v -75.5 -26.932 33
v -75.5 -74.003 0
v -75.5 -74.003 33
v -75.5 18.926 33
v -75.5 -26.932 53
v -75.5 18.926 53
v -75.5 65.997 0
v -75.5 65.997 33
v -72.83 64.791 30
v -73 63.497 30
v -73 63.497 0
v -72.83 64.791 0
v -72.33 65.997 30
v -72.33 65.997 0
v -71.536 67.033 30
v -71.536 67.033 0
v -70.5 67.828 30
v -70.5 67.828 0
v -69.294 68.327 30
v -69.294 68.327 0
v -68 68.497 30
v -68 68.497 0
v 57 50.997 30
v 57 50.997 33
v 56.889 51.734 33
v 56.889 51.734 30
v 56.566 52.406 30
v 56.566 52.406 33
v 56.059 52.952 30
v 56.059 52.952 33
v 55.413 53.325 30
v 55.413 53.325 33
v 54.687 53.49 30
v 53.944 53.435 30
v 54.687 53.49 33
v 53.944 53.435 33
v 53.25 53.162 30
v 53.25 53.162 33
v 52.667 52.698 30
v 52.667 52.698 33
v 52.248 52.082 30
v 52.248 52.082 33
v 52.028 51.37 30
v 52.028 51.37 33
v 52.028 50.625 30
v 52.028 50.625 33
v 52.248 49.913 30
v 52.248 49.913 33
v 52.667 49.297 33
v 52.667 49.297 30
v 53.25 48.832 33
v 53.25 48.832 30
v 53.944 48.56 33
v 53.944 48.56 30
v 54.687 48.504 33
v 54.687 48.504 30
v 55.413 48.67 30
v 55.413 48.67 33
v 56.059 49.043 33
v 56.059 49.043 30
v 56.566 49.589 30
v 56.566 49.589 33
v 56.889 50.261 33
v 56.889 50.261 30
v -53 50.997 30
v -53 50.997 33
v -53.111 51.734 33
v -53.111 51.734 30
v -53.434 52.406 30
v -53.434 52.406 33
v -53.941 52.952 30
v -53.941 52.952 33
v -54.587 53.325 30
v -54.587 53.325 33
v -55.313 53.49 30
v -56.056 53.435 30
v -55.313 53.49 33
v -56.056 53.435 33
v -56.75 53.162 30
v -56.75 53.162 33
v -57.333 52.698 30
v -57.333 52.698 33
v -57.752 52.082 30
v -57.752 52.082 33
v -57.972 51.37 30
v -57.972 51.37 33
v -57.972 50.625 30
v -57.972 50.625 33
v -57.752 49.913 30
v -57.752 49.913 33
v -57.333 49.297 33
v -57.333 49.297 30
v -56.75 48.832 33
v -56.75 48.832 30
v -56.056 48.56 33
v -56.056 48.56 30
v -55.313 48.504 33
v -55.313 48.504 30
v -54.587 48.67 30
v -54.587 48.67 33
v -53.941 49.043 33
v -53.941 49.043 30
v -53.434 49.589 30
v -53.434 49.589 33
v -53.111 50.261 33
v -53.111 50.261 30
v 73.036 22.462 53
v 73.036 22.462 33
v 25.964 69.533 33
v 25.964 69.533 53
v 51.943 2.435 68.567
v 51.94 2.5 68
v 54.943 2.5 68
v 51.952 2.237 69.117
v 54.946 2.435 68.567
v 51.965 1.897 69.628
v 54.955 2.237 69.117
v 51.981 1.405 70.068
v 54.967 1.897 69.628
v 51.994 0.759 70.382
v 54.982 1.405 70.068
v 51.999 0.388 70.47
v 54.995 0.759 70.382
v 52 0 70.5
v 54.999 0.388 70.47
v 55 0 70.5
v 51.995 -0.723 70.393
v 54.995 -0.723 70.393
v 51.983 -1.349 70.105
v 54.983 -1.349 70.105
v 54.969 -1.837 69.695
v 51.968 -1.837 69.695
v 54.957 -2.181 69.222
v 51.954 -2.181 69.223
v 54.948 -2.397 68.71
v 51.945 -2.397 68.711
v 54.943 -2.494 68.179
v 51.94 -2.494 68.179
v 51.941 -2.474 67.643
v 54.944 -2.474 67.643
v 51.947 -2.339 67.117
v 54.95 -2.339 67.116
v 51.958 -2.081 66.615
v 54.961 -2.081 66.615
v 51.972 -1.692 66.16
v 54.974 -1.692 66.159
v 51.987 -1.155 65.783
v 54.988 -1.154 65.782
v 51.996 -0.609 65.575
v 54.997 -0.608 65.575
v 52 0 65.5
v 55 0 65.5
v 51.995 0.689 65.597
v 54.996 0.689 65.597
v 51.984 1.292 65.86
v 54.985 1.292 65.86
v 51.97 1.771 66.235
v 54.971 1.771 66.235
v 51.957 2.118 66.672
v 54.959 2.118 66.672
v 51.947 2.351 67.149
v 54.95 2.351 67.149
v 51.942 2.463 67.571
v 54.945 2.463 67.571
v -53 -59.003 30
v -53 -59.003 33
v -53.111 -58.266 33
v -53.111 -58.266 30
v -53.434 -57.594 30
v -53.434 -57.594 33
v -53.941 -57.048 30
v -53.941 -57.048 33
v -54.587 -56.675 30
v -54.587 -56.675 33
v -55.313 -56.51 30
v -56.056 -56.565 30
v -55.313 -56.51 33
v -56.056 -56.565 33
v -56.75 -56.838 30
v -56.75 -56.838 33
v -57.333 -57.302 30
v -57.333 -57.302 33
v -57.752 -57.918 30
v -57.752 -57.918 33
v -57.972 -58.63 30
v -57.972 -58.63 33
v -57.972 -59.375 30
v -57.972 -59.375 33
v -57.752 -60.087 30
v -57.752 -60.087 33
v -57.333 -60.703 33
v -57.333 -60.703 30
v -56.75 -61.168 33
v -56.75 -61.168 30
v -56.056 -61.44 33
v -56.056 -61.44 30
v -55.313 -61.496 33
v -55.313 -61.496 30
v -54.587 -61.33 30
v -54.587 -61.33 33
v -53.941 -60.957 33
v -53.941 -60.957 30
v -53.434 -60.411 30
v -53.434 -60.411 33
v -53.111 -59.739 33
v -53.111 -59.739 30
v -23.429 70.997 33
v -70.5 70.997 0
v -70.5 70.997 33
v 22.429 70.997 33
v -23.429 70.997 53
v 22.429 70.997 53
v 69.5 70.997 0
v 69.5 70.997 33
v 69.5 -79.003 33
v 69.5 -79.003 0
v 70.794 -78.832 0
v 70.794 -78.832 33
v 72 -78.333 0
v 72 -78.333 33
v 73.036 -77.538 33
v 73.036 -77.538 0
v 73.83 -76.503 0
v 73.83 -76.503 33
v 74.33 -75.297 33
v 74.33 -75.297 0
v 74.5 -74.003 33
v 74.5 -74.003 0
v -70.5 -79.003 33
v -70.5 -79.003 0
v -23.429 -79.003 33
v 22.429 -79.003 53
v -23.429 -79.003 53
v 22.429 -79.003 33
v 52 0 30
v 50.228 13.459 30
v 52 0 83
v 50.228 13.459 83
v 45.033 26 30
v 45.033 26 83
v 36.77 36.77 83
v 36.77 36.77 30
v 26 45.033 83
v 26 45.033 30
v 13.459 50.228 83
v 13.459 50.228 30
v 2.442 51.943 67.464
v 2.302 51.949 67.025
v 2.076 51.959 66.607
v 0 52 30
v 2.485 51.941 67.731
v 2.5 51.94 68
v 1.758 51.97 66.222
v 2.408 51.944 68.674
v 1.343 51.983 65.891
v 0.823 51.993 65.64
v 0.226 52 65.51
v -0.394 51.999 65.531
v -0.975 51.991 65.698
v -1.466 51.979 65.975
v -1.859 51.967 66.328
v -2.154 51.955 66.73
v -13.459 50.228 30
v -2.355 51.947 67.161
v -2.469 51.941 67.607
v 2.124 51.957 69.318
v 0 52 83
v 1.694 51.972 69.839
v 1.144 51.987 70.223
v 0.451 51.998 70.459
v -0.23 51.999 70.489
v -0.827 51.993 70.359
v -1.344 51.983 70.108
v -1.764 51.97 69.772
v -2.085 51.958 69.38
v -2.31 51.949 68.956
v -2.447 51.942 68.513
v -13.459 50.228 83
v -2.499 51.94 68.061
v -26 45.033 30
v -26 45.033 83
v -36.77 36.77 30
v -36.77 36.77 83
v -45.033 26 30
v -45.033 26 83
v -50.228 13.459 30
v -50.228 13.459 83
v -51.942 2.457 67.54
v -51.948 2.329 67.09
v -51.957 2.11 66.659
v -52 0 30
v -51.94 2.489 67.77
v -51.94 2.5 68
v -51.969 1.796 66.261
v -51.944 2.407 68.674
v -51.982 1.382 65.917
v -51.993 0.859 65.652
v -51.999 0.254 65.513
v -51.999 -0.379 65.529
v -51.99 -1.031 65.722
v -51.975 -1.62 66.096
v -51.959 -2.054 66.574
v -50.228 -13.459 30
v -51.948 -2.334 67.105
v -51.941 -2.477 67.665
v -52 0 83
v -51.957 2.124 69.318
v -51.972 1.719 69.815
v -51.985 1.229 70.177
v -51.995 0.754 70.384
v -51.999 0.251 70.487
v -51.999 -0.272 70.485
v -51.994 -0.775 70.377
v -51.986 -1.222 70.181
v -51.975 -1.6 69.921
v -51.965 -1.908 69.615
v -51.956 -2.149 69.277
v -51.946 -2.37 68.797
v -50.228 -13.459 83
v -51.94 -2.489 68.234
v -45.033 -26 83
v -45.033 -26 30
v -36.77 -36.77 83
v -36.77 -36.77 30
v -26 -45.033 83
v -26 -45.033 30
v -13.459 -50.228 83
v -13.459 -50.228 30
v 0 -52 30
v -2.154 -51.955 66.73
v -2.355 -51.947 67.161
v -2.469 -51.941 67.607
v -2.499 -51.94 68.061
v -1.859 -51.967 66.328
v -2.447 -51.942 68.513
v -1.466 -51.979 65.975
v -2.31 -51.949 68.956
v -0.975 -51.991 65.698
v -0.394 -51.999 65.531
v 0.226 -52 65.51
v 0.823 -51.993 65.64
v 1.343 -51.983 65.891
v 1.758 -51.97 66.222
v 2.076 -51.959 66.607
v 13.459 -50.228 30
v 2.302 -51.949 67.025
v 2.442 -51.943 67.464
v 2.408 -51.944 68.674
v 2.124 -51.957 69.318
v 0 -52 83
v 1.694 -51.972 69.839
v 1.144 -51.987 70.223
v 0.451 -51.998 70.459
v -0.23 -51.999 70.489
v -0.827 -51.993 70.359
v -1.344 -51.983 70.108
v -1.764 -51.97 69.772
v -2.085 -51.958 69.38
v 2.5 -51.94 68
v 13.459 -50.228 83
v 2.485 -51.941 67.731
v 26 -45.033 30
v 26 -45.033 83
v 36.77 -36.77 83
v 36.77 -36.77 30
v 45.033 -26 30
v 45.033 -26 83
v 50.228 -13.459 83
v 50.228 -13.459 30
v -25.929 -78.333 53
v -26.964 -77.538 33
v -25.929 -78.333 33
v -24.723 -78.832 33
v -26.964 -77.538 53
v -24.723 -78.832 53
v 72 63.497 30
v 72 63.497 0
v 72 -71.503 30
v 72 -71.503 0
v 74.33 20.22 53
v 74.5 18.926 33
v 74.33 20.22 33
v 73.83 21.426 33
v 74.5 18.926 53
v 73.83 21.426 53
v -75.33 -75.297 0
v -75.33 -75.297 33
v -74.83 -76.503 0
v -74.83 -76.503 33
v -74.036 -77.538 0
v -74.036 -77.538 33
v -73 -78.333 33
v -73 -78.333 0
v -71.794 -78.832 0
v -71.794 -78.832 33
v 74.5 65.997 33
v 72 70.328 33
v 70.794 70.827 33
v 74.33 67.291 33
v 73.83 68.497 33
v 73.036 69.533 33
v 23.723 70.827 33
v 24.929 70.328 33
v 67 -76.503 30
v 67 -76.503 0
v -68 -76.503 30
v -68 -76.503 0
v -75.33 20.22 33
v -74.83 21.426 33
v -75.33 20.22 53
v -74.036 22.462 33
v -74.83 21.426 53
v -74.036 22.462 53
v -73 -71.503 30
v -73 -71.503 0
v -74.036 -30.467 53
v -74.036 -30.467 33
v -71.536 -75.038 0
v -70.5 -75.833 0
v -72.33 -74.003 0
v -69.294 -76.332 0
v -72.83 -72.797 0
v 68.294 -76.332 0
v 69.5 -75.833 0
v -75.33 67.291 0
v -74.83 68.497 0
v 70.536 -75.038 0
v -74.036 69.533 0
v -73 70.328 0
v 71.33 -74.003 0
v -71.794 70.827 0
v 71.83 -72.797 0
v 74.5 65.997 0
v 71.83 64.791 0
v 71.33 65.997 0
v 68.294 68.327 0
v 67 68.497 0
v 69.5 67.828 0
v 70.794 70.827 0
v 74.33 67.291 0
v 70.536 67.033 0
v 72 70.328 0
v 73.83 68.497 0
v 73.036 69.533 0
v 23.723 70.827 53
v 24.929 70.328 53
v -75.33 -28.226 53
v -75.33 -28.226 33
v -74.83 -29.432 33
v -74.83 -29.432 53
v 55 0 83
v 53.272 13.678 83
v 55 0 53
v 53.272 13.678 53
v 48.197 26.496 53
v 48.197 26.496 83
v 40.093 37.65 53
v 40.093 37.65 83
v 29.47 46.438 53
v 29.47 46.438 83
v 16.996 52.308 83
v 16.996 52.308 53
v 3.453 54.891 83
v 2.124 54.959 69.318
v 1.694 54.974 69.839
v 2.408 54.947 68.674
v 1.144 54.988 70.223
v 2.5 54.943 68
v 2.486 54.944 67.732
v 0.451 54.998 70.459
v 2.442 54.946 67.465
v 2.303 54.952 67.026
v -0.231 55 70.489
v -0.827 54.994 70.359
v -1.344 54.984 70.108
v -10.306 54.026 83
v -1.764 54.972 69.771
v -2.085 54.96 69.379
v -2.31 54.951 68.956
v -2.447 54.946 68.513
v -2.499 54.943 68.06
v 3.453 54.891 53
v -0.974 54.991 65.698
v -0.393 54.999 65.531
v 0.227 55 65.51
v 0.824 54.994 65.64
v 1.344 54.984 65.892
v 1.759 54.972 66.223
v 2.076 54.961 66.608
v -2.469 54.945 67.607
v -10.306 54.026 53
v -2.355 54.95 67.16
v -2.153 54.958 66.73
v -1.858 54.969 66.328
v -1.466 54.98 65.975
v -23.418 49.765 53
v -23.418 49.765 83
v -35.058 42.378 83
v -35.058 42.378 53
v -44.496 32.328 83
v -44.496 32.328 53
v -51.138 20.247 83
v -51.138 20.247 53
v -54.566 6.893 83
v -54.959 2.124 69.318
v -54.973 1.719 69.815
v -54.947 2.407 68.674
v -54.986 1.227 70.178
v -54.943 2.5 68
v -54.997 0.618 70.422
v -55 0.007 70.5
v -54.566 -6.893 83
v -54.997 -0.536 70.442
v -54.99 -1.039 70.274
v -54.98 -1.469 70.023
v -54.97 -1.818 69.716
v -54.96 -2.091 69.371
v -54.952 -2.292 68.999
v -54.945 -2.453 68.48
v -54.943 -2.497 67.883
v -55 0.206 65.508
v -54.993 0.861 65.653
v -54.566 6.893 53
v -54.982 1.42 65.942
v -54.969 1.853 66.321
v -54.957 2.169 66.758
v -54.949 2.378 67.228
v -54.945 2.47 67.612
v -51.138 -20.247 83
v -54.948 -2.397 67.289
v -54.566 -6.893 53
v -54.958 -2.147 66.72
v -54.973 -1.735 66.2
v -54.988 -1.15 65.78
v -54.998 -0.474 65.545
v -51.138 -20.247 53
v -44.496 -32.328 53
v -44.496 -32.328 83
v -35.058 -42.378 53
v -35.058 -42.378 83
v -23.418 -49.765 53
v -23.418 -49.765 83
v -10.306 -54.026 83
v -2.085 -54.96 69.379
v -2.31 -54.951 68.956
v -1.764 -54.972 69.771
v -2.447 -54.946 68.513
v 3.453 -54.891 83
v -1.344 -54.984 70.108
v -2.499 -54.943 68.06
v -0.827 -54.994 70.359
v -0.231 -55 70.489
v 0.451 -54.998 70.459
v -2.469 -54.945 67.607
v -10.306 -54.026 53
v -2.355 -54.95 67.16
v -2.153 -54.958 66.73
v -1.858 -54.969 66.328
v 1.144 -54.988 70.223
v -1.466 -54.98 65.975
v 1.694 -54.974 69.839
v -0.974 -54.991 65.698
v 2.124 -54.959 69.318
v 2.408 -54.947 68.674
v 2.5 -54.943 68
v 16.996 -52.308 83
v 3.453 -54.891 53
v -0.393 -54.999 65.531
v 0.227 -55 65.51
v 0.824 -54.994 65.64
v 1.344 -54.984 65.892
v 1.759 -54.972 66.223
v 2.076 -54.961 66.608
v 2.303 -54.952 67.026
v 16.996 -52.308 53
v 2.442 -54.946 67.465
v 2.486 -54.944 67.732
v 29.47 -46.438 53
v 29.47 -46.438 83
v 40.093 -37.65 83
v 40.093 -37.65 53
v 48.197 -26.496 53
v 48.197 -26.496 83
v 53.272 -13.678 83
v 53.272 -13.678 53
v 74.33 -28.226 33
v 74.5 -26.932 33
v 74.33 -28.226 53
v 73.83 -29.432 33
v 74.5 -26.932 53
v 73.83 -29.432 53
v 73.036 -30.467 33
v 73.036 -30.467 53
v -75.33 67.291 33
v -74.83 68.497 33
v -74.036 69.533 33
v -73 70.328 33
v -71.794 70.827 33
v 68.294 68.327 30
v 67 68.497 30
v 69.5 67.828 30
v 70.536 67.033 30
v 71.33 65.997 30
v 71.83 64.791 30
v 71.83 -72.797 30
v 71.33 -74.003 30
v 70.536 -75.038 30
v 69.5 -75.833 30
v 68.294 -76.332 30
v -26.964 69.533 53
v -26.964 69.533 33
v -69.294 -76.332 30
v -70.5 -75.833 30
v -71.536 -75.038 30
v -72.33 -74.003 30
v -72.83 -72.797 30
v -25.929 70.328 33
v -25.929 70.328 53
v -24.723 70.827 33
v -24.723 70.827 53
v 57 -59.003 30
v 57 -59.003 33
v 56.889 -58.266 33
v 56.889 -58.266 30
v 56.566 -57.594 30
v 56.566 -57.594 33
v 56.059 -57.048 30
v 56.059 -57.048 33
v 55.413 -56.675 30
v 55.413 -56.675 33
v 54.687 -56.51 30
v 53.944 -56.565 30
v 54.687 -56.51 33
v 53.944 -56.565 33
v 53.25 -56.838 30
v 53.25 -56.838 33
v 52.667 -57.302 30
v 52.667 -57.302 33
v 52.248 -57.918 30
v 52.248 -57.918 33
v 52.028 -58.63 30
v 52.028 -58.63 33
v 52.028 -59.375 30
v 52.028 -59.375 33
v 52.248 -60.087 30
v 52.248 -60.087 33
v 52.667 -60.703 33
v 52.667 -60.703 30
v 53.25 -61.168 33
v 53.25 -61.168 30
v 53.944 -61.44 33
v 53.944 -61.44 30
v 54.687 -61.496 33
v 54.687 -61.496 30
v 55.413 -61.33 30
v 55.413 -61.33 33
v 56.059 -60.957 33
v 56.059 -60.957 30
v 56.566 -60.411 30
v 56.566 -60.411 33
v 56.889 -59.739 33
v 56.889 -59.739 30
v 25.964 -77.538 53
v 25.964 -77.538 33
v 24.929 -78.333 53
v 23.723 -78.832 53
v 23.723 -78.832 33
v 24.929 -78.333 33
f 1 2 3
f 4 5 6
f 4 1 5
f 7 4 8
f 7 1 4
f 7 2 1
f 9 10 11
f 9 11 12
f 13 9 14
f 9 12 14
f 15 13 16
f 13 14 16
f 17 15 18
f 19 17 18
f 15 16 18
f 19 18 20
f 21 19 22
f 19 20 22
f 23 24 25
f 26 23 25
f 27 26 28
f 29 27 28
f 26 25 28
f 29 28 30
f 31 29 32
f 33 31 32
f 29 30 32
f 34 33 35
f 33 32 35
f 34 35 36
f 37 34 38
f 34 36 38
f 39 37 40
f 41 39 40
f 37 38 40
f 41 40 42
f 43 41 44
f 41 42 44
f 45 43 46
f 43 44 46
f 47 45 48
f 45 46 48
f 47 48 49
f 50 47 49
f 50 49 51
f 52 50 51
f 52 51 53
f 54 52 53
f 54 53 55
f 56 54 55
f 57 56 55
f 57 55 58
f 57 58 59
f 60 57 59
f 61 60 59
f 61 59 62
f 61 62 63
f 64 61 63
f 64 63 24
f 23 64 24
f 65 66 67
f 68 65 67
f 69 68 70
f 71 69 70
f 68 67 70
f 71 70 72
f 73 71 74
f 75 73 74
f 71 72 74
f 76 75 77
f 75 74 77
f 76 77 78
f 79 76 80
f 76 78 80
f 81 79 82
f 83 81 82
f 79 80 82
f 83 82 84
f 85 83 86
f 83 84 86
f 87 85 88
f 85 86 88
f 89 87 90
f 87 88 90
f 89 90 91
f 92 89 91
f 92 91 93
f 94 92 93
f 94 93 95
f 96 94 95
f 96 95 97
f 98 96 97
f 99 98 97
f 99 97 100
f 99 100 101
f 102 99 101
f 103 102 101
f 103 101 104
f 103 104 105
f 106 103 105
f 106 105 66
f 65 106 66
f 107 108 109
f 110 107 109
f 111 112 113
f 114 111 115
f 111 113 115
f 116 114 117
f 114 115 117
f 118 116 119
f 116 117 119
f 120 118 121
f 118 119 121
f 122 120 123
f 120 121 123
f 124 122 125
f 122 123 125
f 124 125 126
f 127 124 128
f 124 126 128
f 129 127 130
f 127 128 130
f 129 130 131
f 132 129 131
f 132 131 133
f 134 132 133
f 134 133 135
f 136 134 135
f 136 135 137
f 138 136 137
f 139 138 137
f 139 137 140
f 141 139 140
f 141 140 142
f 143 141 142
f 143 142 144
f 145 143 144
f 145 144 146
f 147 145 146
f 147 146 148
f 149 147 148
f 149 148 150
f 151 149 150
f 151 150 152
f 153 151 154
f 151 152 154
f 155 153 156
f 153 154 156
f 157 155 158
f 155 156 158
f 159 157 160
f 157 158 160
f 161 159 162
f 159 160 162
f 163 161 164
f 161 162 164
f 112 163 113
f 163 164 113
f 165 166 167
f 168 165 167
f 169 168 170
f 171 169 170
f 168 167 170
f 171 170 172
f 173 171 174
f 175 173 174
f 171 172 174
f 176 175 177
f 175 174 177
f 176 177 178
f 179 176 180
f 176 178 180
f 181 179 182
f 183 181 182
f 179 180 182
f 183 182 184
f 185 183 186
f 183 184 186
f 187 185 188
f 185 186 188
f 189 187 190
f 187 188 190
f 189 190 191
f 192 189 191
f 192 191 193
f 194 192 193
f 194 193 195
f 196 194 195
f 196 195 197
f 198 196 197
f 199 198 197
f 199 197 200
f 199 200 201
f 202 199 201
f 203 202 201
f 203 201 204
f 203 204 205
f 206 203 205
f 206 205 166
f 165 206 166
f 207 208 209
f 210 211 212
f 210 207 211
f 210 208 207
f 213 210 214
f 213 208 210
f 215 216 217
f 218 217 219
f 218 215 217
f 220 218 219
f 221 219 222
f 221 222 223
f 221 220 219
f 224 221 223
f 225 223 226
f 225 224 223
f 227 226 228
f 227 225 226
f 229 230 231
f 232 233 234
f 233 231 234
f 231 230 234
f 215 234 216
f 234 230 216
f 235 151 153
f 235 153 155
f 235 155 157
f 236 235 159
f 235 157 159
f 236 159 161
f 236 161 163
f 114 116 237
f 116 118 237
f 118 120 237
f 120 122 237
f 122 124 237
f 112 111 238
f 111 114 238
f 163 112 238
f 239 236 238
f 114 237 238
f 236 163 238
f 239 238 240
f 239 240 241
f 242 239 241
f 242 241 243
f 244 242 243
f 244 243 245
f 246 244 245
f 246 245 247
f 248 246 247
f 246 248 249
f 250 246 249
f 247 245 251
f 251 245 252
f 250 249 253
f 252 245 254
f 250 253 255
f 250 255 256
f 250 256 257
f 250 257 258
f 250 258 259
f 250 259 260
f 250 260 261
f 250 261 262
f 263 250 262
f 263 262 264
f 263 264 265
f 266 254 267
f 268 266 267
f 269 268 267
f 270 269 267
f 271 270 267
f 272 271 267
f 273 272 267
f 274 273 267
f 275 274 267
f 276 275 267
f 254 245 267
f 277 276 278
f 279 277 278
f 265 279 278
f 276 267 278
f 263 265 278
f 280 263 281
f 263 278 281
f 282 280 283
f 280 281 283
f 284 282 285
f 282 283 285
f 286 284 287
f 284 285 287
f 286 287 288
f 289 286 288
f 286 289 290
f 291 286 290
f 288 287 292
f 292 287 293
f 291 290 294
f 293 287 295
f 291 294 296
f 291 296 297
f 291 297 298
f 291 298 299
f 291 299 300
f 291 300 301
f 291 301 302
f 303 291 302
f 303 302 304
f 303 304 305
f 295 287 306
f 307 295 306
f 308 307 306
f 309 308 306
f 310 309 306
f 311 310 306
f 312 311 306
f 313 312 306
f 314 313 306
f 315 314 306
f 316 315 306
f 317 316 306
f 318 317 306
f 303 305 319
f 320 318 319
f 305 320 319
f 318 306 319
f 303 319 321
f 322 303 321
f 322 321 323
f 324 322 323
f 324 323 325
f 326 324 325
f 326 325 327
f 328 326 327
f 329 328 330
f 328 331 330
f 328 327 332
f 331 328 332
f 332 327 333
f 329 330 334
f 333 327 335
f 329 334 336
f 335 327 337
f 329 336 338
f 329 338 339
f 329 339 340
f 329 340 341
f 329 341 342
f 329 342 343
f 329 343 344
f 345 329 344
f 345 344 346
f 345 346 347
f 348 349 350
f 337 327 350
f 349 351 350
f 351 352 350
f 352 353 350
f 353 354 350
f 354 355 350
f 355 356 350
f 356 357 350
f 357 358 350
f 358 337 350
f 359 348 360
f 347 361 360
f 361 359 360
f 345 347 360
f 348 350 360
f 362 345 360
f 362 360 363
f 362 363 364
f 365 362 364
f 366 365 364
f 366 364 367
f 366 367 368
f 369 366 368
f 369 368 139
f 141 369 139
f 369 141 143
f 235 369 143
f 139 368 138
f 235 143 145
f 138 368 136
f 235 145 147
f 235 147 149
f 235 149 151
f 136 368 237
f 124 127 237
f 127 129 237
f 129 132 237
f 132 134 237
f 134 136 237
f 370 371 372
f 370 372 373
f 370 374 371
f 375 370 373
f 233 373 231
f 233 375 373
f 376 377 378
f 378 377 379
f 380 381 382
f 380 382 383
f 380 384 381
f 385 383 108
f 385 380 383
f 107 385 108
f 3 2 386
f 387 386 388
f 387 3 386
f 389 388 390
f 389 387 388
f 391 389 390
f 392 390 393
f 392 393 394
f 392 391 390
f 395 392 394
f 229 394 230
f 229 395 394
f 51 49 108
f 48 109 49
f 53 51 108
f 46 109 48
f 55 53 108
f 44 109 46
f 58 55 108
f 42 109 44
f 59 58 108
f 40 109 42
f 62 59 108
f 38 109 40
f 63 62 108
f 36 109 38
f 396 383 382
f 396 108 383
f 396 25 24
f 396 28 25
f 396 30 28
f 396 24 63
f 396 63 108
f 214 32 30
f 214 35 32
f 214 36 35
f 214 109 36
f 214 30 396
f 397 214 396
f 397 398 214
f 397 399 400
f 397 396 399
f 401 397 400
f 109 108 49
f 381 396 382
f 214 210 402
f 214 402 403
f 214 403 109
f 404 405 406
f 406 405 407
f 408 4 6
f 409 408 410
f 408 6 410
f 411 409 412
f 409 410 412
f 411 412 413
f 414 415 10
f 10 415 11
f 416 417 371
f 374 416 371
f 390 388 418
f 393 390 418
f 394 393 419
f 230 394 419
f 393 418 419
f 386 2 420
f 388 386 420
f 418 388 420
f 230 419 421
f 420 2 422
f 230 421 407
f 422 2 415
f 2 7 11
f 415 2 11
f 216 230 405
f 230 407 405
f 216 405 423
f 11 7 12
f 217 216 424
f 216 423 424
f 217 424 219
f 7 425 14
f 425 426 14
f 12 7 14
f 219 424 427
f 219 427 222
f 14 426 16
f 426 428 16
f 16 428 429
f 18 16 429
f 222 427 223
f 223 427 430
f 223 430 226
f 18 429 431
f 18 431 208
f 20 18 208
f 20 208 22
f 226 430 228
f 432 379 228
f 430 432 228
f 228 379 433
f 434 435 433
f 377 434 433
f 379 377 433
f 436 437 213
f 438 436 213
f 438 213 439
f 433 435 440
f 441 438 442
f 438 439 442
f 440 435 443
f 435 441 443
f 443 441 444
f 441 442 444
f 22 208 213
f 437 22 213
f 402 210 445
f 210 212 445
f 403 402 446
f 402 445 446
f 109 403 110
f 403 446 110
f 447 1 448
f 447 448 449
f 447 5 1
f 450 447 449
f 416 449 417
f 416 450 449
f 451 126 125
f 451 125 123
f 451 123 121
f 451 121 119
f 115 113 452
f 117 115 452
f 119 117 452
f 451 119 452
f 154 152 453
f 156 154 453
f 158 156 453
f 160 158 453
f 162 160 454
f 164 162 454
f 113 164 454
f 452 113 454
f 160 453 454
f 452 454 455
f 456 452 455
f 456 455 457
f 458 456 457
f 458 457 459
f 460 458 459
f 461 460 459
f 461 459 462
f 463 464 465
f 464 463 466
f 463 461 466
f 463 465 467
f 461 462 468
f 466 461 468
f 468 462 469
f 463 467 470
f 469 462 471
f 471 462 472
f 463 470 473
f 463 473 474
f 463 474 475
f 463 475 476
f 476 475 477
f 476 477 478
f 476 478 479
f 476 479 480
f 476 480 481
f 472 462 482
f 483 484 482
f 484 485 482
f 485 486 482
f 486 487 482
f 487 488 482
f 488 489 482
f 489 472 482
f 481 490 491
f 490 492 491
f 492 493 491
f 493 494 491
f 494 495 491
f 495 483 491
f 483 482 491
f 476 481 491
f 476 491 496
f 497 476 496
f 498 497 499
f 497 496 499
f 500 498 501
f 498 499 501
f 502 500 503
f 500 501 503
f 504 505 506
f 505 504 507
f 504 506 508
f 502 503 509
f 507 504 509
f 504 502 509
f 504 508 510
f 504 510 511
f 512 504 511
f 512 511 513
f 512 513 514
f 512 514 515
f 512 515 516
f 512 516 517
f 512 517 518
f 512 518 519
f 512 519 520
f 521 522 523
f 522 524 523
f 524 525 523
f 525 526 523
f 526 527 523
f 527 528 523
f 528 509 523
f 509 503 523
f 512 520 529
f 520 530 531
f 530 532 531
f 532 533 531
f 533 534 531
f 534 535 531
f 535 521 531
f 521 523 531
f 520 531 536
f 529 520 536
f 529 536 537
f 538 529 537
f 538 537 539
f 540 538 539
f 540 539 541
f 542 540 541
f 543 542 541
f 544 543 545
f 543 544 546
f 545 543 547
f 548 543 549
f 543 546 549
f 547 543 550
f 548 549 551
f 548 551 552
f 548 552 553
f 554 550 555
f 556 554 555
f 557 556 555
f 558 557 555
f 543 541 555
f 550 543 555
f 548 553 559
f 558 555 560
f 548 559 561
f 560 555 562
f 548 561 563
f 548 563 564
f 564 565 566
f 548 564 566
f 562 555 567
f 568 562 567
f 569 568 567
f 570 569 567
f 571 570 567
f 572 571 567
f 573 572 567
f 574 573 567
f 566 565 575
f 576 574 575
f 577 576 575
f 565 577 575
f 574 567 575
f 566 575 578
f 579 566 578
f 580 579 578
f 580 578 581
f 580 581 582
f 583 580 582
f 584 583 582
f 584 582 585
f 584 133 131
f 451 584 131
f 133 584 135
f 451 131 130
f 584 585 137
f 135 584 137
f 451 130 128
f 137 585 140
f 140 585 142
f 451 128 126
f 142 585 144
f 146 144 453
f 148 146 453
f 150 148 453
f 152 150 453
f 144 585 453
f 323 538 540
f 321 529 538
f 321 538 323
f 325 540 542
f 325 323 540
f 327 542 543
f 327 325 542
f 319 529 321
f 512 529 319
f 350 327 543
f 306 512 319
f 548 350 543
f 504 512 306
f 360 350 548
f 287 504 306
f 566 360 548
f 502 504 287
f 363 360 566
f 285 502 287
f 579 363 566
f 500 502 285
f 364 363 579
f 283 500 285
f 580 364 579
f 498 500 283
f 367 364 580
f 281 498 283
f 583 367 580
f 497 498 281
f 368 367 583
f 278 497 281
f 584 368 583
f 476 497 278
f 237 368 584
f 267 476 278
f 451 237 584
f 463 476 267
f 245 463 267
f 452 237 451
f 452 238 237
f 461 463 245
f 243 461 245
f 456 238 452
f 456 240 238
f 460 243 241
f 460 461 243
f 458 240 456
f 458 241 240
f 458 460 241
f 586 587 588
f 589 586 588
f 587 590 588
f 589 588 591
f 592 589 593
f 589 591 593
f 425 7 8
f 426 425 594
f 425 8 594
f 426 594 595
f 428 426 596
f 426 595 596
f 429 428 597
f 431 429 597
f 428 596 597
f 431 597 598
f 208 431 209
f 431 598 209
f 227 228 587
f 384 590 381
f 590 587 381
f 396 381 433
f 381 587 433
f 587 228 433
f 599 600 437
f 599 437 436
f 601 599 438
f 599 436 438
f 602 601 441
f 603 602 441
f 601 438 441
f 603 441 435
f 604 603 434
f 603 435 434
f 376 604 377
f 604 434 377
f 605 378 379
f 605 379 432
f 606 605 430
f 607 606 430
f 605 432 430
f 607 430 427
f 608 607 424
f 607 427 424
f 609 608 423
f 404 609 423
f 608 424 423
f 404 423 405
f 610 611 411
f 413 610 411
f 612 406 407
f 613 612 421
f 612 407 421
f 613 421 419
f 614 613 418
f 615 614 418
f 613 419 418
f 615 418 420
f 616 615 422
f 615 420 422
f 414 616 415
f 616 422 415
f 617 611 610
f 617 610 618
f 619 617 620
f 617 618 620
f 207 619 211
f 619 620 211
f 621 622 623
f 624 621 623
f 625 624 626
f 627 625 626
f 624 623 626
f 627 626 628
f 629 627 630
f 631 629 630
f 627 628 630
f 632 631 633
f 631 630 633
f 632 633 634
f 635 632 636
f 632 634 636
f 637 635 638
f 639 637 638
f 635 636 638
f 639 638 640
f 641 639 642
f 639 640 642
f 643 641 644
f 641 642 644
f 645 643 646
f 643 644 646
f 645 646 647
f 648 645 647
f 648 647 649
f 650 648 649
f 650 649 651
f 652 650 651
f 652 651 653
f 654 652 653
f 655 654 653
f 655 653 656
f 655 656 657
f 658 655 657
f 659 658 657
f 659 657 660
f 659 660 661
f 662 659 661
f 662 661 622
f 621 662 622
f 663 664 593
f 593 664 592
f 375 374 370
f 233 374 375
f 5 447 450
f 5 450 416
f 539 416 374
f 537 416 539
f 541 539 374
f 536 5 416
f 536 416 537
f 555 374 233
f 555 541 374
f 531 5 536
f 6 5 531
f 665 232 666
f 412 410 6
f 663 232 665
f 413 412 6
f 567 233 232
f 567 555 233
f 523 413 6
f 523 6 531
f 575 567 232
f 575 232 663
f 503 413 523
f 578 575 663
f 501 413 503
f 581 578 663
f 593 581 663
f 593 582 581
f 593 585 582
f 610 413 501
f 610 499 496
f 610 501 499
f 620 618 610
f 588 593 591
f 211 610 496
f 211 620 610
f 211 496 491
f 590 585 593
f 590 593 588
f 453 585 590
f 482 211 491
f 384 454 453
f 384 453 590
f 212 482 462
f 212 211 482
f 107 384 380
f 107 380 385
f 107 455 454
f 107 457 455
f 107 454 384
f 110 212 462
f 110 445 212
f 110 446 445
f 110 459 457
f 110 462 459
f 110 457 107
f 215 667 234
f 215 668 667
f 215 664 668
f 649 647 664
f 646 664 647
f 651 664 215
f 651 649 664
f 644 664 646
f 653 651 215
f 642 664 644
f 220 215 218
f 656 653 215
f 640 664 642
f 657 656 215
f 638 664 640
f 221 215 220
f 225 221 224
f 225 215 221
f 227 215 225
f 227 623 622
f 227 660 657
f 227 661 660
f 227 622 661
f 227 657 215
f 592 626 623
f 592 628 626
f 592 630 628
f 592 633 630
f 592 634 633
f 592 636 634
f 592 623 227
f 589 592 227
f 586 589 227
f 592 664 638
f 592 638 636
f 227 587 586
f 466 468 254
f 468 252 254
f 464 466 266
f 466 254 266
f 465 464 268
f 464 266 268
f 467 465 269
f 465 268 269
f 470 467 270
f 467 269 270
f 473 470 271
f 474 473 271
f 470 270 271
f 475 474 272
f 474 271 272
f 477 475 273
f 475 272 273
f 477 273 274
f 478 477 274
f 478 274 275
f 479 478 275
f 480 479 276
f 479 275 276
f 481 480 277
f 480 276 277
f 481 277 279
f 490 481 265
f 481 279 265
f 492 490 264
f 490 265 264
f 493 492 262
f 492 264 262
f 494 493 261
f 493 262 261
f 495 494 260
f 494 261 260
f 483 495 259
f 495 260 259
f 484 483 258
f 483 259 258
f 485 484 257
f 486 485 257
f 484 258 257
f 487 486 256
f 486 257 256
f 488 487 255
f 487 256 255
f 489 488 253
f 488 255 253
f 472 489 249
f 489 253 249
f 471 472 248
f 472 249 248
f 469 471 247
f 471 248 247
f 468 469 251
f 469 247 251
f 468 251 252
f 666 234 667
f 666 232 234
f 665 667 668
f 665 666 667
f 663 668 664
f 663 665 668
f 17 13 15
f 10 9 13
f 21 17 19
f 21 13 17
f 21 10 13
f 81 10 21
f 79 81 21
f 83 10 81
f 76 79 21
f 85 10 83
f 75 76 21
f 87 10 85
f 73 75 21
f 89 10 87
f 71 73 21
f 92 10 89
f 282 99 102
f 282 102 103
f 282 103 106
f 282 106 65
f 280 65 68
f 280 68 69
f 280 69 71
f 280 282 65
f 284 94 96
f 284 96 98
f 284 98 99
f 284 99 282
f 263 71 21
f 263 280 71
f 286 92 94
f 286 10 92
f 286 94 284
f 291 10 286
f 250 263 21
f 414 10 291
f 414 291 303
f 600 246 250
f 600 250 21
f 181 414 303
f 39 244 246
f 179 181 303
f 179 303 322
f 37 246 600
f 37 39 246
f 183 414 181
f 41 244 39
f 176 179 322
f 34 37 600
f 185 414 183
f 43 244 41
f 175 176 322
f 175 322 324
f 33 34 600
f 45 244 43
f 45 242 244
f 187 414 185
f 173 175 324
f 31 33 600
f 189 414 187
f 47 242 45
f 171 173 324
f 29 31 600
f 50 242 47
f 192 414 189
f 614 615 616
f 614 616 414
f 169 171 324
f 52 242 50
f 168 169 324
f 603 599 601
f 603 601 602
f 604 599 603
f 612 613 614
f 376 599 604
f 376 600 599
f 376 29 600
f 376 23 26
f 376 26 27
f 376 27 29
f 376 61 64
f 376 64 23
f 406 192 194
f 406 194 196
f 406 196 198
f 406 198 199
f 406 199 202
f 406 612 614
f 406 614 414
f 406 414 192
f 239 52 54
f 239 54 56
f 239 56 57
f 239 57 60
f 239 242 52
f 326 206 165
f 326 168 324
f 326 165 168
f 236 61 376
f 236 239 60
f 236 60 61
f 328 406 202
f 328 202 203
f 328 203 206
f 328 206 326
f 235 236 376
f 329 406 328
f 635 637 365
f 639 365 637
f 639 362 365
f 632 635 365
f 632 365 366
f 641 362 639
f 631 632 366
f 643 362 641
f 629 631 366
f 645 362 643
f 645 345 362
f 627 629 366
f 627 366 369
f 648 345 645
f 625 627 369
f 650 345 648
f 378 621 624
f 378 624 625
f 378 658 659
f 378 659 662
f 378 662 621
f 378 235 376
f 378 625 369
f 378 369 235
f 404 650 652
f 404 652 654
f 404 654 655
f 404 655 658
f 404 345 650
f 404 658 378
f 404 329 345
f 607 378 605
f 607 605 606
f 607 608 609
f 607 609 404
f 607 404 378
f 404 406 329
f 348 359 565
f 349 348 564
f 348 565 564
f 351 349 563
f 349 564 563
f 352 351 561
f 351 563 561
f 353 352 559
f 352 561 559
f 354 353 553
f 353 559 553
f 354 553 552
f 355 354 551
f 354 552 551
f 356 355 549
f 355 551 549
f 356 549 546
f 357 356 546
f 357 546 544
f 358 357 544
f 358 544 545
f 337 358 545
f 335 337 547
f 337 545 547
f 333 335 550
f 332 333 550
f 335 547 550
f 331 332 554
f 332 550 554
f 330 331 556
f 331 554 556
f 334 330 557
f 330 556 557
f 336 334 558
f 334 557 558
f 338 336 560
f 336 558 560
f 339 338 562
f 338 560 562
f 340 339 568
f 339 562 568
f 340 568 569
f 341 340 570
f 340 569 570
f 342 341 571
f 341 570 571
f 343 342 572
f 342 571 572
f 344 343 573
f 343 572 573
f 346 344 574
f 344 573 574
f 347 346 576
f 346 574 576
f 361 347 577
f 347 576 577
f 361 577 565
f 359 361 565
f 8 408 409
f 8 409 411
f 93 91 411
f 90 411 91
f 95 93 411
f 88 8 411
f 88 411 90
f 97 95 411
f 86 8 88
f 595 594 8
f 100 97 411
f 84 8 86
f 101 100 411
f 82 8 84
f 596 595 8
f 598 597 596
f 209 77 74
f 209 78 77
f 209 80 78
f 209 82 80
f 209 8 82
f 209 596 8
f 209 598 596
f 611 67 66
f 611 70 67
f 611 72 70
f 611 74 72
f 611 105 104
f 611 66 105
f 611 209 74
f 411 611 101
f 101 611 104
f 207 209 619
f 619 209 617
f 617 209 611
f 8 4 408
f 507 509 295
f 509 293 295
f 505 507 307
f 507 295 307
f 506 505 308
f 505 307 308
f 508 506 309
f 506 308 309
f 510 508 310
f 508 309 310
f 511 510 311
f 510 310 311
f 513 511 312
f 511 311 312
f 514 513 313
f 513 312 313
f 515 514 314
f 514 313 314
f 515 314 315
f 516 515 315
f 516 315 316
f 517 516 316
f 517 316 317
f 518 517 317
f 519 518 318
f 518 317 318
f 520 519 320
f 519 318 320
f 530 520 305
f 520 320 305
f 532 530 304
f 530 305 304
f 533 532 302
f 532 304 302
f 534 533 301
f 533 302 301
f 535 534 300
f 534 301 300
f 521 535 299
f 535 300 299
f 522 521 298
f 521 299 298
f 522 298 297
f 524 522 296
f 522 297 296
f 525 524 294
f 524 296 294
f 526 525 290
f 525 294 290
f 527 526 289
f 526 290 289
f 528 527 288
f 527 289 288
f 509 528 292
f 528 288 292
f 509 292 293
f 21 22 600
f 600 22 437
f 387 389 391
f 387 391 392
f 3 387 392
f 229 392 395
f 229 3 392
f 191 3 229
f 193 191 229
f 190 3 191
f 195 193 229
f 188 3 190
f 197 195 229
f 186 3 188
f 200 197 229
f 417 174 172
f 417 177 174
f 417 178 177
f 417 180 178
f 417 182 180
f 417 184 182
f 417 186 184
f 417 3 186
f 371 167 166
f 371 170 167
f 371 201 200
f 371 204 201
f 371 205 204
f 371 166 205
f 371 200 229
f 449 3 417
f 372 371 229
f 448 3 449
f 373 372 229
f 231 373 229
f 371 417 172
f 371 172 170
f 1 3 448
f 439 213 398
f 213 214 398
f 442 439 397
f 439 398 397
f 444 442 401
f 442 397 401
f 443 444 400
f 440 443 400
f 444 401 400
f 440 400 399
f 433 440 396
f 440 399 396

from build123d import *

# Parameters (mm, degrees)
F0_W      = 150
F0_H      = 150
F1_DEPTH  = 33
F3_DEPTH  = 20
F4_R      = 5
F5_R      = 55
F6_DEPTH  = 30
F8_DEPTH  = 30
F9_R      = 52
F10_DEPTH = 83.001
F11_R     = 2.5
F12_DEPTH = 33.001
F13_R     = 2.5
F14_DEPTH = 33.001
F15_R     = 2.5
F16_DEPTH = 33.001
F17_R     = 2.5
F18_DEPTH = 33.001
F19_R     = 5
F20_R     = 2.5
F21_DEPTH = 75
F22_R     = 2.5
F23_DEPTH = 75


with BuildPart() as f1:
    # F0 (on Top) → F1 (new body)
    with BuildSketch(Plane.XY):
        with Locations((-0.500000082, -4.0026037022)):
            Rectangle(F0_W, F0_H)
    extrude(amount=F1_DEPTH)

    # F2 (on face) → F3 (join)
    with BuildSketch(Plane.XY.offset(33)):
        Polygon((24.499999918, 70.9973962978), (-25.500000082, 70.9973962978), (-75.500000082, 20.9973962978), (-75.500000082, -29.0026037022), (-25.500000082, -79.0026037022), (24.499999918, -79.0026037022), (74.499999918, -29.0026037022), (74.499999918, 20.9973962978), align=None)
    extrude(amount=F3_DEPTH)

    # F4
    f4_edges = [f1.edges().sort_by_distance(p)[0] for p in [
        (-75.5, 70.997396, 16.5),
        (-75.5, -79.002604, 16.5),
        (74.5, 70.997396, 16.5),
        (74.5, -79.002604, 16.5),
    ]]
    fillet(f4_edges, radius=F4_R)

    # F5 (on face) → F6 (join)
    with BuildSketch(Plane.XY.offset(53)):
        Circle(F5_R)
    extrude(amount=F6_DEPTH)

    # F7 (on face) → F8 (cut)
    with BuildSketch(Plane(origin=(0, 0, 0), x_dir=(1, 0, 0), z_dir=(0, 0, -1))):
        with BuildLine():
            Line((66.999999918, 76.5026037022), (-68.000000082, 76.5026037022))
            ThreePointArc((-68.000000082, 76.5026037022), (-71.5355339879, 75.0381376082), (-73.000000082, 71.5026037022))
            Line((-73.000000082, 71.5026037022), (-73.000000082, -63.4973962978))
            ThreePointArc((-73.000000082, -63.4973962978), (-71.5355339879, -67.0329302037), (-68.000000082, -68.4973962978))
            Line((-68.000000082, -68.4973962978), (66.999999918, -68.4973962978))
            ThreePointArc((66.999999918, -68.4973962978), (70.535533824, -67.0329302037), (71.999999918, -63.4973962978))
            Line((71.999999918, -63.4973962978), (71.999999918, 71.5026037022))
            ThreePointArc((71.999999918, 71.5026037022), (70.535533824, 75.0381376082), (66.999999918, 76.5026037022))
        make_face()
    extrude(amount=-F8_DEPTH, mode=Mode.SUBTRACT)

    # F9 (on face) → F10 (cut, through all)
    with BuildSketch(Plane.XY.offset(83)):
        Circle(F9_R)
    extrude(amount=-F10_DEPTH, mode=Mode.SUBTRACT)

    # F11 (on face) → F12 (cut, through all)
    with BuildSketch(Plane.XY.offset(33)):
        with Locations((-55.500000082, 50.9973962978)):
            Circle(F11_R)
    extrude(amount=-F12_DEPTH, mode=Mode.SUBTRACT)

    # F13 (on face) → F14 (cut, through all)
    with BuildSketch(Plane.XY.offset(33)):
        with Locations((54.499999918, 50.9973962978)):
            Circle(F13_R)
    extrude(amount=-F14_DEPTH, mode=Mode.SUBTRACT)

    # F15 (on face) → F16 (cut, through all)
    with BuildSketch(Plane.XY.offset(33)):
        with Locations((-55.500000082, -59.0026037022)):
            Circle(F15_R)
    extrude(amount=-F16_DEPTH, mode=Mode.SUBTRACT)

    # F17 (on face) → F18 (cut, through all)
    with BuildSketch(Plane.XY.offset(33)):
        with Locations((54.499999918, -59.0026037022)):
            Circle(F17_R)
    extrude(amount=-F18_DEPTH, mode=Mode.SUBTRACT)

    # F19
    f19_edges = [f1.edges().sort_by_distance(p)[0] for p in [
        (-75.5, -29.002604, 43),
        (-75.5, 20.997396, 43),
        (-25.5, -79.002604, 43),
        (24.5, -79.002604, 43),
        (74.5, -29.002604, 43),
        (74.5, 20.997396, 43),
        (24.5, 70.997396, 43),
        (-25.5, 70.997396, 43),
    ]]
    fillet(f19_edges, radius=F19_R)

    # F20 (on Right) → F21 (cut, symmetric)
    with BuildSketch(Plane.YZ):
        with Locations((0, 68)):
            Circle(F20_R)
    extrude(amount=F21_DEPTH, both=True, mode=Mode.SUBTRACT)

    # F22 (on Front) → F23 (cut, symmetric)
    with BuildSketch(Plane.XZ):
        with Locations((0, 68)):
            Circle(F22_R)
    extrude(amount=F23_DEPTH, both=True, mode=Mode.SUBTRACT)


solid = f1.part
